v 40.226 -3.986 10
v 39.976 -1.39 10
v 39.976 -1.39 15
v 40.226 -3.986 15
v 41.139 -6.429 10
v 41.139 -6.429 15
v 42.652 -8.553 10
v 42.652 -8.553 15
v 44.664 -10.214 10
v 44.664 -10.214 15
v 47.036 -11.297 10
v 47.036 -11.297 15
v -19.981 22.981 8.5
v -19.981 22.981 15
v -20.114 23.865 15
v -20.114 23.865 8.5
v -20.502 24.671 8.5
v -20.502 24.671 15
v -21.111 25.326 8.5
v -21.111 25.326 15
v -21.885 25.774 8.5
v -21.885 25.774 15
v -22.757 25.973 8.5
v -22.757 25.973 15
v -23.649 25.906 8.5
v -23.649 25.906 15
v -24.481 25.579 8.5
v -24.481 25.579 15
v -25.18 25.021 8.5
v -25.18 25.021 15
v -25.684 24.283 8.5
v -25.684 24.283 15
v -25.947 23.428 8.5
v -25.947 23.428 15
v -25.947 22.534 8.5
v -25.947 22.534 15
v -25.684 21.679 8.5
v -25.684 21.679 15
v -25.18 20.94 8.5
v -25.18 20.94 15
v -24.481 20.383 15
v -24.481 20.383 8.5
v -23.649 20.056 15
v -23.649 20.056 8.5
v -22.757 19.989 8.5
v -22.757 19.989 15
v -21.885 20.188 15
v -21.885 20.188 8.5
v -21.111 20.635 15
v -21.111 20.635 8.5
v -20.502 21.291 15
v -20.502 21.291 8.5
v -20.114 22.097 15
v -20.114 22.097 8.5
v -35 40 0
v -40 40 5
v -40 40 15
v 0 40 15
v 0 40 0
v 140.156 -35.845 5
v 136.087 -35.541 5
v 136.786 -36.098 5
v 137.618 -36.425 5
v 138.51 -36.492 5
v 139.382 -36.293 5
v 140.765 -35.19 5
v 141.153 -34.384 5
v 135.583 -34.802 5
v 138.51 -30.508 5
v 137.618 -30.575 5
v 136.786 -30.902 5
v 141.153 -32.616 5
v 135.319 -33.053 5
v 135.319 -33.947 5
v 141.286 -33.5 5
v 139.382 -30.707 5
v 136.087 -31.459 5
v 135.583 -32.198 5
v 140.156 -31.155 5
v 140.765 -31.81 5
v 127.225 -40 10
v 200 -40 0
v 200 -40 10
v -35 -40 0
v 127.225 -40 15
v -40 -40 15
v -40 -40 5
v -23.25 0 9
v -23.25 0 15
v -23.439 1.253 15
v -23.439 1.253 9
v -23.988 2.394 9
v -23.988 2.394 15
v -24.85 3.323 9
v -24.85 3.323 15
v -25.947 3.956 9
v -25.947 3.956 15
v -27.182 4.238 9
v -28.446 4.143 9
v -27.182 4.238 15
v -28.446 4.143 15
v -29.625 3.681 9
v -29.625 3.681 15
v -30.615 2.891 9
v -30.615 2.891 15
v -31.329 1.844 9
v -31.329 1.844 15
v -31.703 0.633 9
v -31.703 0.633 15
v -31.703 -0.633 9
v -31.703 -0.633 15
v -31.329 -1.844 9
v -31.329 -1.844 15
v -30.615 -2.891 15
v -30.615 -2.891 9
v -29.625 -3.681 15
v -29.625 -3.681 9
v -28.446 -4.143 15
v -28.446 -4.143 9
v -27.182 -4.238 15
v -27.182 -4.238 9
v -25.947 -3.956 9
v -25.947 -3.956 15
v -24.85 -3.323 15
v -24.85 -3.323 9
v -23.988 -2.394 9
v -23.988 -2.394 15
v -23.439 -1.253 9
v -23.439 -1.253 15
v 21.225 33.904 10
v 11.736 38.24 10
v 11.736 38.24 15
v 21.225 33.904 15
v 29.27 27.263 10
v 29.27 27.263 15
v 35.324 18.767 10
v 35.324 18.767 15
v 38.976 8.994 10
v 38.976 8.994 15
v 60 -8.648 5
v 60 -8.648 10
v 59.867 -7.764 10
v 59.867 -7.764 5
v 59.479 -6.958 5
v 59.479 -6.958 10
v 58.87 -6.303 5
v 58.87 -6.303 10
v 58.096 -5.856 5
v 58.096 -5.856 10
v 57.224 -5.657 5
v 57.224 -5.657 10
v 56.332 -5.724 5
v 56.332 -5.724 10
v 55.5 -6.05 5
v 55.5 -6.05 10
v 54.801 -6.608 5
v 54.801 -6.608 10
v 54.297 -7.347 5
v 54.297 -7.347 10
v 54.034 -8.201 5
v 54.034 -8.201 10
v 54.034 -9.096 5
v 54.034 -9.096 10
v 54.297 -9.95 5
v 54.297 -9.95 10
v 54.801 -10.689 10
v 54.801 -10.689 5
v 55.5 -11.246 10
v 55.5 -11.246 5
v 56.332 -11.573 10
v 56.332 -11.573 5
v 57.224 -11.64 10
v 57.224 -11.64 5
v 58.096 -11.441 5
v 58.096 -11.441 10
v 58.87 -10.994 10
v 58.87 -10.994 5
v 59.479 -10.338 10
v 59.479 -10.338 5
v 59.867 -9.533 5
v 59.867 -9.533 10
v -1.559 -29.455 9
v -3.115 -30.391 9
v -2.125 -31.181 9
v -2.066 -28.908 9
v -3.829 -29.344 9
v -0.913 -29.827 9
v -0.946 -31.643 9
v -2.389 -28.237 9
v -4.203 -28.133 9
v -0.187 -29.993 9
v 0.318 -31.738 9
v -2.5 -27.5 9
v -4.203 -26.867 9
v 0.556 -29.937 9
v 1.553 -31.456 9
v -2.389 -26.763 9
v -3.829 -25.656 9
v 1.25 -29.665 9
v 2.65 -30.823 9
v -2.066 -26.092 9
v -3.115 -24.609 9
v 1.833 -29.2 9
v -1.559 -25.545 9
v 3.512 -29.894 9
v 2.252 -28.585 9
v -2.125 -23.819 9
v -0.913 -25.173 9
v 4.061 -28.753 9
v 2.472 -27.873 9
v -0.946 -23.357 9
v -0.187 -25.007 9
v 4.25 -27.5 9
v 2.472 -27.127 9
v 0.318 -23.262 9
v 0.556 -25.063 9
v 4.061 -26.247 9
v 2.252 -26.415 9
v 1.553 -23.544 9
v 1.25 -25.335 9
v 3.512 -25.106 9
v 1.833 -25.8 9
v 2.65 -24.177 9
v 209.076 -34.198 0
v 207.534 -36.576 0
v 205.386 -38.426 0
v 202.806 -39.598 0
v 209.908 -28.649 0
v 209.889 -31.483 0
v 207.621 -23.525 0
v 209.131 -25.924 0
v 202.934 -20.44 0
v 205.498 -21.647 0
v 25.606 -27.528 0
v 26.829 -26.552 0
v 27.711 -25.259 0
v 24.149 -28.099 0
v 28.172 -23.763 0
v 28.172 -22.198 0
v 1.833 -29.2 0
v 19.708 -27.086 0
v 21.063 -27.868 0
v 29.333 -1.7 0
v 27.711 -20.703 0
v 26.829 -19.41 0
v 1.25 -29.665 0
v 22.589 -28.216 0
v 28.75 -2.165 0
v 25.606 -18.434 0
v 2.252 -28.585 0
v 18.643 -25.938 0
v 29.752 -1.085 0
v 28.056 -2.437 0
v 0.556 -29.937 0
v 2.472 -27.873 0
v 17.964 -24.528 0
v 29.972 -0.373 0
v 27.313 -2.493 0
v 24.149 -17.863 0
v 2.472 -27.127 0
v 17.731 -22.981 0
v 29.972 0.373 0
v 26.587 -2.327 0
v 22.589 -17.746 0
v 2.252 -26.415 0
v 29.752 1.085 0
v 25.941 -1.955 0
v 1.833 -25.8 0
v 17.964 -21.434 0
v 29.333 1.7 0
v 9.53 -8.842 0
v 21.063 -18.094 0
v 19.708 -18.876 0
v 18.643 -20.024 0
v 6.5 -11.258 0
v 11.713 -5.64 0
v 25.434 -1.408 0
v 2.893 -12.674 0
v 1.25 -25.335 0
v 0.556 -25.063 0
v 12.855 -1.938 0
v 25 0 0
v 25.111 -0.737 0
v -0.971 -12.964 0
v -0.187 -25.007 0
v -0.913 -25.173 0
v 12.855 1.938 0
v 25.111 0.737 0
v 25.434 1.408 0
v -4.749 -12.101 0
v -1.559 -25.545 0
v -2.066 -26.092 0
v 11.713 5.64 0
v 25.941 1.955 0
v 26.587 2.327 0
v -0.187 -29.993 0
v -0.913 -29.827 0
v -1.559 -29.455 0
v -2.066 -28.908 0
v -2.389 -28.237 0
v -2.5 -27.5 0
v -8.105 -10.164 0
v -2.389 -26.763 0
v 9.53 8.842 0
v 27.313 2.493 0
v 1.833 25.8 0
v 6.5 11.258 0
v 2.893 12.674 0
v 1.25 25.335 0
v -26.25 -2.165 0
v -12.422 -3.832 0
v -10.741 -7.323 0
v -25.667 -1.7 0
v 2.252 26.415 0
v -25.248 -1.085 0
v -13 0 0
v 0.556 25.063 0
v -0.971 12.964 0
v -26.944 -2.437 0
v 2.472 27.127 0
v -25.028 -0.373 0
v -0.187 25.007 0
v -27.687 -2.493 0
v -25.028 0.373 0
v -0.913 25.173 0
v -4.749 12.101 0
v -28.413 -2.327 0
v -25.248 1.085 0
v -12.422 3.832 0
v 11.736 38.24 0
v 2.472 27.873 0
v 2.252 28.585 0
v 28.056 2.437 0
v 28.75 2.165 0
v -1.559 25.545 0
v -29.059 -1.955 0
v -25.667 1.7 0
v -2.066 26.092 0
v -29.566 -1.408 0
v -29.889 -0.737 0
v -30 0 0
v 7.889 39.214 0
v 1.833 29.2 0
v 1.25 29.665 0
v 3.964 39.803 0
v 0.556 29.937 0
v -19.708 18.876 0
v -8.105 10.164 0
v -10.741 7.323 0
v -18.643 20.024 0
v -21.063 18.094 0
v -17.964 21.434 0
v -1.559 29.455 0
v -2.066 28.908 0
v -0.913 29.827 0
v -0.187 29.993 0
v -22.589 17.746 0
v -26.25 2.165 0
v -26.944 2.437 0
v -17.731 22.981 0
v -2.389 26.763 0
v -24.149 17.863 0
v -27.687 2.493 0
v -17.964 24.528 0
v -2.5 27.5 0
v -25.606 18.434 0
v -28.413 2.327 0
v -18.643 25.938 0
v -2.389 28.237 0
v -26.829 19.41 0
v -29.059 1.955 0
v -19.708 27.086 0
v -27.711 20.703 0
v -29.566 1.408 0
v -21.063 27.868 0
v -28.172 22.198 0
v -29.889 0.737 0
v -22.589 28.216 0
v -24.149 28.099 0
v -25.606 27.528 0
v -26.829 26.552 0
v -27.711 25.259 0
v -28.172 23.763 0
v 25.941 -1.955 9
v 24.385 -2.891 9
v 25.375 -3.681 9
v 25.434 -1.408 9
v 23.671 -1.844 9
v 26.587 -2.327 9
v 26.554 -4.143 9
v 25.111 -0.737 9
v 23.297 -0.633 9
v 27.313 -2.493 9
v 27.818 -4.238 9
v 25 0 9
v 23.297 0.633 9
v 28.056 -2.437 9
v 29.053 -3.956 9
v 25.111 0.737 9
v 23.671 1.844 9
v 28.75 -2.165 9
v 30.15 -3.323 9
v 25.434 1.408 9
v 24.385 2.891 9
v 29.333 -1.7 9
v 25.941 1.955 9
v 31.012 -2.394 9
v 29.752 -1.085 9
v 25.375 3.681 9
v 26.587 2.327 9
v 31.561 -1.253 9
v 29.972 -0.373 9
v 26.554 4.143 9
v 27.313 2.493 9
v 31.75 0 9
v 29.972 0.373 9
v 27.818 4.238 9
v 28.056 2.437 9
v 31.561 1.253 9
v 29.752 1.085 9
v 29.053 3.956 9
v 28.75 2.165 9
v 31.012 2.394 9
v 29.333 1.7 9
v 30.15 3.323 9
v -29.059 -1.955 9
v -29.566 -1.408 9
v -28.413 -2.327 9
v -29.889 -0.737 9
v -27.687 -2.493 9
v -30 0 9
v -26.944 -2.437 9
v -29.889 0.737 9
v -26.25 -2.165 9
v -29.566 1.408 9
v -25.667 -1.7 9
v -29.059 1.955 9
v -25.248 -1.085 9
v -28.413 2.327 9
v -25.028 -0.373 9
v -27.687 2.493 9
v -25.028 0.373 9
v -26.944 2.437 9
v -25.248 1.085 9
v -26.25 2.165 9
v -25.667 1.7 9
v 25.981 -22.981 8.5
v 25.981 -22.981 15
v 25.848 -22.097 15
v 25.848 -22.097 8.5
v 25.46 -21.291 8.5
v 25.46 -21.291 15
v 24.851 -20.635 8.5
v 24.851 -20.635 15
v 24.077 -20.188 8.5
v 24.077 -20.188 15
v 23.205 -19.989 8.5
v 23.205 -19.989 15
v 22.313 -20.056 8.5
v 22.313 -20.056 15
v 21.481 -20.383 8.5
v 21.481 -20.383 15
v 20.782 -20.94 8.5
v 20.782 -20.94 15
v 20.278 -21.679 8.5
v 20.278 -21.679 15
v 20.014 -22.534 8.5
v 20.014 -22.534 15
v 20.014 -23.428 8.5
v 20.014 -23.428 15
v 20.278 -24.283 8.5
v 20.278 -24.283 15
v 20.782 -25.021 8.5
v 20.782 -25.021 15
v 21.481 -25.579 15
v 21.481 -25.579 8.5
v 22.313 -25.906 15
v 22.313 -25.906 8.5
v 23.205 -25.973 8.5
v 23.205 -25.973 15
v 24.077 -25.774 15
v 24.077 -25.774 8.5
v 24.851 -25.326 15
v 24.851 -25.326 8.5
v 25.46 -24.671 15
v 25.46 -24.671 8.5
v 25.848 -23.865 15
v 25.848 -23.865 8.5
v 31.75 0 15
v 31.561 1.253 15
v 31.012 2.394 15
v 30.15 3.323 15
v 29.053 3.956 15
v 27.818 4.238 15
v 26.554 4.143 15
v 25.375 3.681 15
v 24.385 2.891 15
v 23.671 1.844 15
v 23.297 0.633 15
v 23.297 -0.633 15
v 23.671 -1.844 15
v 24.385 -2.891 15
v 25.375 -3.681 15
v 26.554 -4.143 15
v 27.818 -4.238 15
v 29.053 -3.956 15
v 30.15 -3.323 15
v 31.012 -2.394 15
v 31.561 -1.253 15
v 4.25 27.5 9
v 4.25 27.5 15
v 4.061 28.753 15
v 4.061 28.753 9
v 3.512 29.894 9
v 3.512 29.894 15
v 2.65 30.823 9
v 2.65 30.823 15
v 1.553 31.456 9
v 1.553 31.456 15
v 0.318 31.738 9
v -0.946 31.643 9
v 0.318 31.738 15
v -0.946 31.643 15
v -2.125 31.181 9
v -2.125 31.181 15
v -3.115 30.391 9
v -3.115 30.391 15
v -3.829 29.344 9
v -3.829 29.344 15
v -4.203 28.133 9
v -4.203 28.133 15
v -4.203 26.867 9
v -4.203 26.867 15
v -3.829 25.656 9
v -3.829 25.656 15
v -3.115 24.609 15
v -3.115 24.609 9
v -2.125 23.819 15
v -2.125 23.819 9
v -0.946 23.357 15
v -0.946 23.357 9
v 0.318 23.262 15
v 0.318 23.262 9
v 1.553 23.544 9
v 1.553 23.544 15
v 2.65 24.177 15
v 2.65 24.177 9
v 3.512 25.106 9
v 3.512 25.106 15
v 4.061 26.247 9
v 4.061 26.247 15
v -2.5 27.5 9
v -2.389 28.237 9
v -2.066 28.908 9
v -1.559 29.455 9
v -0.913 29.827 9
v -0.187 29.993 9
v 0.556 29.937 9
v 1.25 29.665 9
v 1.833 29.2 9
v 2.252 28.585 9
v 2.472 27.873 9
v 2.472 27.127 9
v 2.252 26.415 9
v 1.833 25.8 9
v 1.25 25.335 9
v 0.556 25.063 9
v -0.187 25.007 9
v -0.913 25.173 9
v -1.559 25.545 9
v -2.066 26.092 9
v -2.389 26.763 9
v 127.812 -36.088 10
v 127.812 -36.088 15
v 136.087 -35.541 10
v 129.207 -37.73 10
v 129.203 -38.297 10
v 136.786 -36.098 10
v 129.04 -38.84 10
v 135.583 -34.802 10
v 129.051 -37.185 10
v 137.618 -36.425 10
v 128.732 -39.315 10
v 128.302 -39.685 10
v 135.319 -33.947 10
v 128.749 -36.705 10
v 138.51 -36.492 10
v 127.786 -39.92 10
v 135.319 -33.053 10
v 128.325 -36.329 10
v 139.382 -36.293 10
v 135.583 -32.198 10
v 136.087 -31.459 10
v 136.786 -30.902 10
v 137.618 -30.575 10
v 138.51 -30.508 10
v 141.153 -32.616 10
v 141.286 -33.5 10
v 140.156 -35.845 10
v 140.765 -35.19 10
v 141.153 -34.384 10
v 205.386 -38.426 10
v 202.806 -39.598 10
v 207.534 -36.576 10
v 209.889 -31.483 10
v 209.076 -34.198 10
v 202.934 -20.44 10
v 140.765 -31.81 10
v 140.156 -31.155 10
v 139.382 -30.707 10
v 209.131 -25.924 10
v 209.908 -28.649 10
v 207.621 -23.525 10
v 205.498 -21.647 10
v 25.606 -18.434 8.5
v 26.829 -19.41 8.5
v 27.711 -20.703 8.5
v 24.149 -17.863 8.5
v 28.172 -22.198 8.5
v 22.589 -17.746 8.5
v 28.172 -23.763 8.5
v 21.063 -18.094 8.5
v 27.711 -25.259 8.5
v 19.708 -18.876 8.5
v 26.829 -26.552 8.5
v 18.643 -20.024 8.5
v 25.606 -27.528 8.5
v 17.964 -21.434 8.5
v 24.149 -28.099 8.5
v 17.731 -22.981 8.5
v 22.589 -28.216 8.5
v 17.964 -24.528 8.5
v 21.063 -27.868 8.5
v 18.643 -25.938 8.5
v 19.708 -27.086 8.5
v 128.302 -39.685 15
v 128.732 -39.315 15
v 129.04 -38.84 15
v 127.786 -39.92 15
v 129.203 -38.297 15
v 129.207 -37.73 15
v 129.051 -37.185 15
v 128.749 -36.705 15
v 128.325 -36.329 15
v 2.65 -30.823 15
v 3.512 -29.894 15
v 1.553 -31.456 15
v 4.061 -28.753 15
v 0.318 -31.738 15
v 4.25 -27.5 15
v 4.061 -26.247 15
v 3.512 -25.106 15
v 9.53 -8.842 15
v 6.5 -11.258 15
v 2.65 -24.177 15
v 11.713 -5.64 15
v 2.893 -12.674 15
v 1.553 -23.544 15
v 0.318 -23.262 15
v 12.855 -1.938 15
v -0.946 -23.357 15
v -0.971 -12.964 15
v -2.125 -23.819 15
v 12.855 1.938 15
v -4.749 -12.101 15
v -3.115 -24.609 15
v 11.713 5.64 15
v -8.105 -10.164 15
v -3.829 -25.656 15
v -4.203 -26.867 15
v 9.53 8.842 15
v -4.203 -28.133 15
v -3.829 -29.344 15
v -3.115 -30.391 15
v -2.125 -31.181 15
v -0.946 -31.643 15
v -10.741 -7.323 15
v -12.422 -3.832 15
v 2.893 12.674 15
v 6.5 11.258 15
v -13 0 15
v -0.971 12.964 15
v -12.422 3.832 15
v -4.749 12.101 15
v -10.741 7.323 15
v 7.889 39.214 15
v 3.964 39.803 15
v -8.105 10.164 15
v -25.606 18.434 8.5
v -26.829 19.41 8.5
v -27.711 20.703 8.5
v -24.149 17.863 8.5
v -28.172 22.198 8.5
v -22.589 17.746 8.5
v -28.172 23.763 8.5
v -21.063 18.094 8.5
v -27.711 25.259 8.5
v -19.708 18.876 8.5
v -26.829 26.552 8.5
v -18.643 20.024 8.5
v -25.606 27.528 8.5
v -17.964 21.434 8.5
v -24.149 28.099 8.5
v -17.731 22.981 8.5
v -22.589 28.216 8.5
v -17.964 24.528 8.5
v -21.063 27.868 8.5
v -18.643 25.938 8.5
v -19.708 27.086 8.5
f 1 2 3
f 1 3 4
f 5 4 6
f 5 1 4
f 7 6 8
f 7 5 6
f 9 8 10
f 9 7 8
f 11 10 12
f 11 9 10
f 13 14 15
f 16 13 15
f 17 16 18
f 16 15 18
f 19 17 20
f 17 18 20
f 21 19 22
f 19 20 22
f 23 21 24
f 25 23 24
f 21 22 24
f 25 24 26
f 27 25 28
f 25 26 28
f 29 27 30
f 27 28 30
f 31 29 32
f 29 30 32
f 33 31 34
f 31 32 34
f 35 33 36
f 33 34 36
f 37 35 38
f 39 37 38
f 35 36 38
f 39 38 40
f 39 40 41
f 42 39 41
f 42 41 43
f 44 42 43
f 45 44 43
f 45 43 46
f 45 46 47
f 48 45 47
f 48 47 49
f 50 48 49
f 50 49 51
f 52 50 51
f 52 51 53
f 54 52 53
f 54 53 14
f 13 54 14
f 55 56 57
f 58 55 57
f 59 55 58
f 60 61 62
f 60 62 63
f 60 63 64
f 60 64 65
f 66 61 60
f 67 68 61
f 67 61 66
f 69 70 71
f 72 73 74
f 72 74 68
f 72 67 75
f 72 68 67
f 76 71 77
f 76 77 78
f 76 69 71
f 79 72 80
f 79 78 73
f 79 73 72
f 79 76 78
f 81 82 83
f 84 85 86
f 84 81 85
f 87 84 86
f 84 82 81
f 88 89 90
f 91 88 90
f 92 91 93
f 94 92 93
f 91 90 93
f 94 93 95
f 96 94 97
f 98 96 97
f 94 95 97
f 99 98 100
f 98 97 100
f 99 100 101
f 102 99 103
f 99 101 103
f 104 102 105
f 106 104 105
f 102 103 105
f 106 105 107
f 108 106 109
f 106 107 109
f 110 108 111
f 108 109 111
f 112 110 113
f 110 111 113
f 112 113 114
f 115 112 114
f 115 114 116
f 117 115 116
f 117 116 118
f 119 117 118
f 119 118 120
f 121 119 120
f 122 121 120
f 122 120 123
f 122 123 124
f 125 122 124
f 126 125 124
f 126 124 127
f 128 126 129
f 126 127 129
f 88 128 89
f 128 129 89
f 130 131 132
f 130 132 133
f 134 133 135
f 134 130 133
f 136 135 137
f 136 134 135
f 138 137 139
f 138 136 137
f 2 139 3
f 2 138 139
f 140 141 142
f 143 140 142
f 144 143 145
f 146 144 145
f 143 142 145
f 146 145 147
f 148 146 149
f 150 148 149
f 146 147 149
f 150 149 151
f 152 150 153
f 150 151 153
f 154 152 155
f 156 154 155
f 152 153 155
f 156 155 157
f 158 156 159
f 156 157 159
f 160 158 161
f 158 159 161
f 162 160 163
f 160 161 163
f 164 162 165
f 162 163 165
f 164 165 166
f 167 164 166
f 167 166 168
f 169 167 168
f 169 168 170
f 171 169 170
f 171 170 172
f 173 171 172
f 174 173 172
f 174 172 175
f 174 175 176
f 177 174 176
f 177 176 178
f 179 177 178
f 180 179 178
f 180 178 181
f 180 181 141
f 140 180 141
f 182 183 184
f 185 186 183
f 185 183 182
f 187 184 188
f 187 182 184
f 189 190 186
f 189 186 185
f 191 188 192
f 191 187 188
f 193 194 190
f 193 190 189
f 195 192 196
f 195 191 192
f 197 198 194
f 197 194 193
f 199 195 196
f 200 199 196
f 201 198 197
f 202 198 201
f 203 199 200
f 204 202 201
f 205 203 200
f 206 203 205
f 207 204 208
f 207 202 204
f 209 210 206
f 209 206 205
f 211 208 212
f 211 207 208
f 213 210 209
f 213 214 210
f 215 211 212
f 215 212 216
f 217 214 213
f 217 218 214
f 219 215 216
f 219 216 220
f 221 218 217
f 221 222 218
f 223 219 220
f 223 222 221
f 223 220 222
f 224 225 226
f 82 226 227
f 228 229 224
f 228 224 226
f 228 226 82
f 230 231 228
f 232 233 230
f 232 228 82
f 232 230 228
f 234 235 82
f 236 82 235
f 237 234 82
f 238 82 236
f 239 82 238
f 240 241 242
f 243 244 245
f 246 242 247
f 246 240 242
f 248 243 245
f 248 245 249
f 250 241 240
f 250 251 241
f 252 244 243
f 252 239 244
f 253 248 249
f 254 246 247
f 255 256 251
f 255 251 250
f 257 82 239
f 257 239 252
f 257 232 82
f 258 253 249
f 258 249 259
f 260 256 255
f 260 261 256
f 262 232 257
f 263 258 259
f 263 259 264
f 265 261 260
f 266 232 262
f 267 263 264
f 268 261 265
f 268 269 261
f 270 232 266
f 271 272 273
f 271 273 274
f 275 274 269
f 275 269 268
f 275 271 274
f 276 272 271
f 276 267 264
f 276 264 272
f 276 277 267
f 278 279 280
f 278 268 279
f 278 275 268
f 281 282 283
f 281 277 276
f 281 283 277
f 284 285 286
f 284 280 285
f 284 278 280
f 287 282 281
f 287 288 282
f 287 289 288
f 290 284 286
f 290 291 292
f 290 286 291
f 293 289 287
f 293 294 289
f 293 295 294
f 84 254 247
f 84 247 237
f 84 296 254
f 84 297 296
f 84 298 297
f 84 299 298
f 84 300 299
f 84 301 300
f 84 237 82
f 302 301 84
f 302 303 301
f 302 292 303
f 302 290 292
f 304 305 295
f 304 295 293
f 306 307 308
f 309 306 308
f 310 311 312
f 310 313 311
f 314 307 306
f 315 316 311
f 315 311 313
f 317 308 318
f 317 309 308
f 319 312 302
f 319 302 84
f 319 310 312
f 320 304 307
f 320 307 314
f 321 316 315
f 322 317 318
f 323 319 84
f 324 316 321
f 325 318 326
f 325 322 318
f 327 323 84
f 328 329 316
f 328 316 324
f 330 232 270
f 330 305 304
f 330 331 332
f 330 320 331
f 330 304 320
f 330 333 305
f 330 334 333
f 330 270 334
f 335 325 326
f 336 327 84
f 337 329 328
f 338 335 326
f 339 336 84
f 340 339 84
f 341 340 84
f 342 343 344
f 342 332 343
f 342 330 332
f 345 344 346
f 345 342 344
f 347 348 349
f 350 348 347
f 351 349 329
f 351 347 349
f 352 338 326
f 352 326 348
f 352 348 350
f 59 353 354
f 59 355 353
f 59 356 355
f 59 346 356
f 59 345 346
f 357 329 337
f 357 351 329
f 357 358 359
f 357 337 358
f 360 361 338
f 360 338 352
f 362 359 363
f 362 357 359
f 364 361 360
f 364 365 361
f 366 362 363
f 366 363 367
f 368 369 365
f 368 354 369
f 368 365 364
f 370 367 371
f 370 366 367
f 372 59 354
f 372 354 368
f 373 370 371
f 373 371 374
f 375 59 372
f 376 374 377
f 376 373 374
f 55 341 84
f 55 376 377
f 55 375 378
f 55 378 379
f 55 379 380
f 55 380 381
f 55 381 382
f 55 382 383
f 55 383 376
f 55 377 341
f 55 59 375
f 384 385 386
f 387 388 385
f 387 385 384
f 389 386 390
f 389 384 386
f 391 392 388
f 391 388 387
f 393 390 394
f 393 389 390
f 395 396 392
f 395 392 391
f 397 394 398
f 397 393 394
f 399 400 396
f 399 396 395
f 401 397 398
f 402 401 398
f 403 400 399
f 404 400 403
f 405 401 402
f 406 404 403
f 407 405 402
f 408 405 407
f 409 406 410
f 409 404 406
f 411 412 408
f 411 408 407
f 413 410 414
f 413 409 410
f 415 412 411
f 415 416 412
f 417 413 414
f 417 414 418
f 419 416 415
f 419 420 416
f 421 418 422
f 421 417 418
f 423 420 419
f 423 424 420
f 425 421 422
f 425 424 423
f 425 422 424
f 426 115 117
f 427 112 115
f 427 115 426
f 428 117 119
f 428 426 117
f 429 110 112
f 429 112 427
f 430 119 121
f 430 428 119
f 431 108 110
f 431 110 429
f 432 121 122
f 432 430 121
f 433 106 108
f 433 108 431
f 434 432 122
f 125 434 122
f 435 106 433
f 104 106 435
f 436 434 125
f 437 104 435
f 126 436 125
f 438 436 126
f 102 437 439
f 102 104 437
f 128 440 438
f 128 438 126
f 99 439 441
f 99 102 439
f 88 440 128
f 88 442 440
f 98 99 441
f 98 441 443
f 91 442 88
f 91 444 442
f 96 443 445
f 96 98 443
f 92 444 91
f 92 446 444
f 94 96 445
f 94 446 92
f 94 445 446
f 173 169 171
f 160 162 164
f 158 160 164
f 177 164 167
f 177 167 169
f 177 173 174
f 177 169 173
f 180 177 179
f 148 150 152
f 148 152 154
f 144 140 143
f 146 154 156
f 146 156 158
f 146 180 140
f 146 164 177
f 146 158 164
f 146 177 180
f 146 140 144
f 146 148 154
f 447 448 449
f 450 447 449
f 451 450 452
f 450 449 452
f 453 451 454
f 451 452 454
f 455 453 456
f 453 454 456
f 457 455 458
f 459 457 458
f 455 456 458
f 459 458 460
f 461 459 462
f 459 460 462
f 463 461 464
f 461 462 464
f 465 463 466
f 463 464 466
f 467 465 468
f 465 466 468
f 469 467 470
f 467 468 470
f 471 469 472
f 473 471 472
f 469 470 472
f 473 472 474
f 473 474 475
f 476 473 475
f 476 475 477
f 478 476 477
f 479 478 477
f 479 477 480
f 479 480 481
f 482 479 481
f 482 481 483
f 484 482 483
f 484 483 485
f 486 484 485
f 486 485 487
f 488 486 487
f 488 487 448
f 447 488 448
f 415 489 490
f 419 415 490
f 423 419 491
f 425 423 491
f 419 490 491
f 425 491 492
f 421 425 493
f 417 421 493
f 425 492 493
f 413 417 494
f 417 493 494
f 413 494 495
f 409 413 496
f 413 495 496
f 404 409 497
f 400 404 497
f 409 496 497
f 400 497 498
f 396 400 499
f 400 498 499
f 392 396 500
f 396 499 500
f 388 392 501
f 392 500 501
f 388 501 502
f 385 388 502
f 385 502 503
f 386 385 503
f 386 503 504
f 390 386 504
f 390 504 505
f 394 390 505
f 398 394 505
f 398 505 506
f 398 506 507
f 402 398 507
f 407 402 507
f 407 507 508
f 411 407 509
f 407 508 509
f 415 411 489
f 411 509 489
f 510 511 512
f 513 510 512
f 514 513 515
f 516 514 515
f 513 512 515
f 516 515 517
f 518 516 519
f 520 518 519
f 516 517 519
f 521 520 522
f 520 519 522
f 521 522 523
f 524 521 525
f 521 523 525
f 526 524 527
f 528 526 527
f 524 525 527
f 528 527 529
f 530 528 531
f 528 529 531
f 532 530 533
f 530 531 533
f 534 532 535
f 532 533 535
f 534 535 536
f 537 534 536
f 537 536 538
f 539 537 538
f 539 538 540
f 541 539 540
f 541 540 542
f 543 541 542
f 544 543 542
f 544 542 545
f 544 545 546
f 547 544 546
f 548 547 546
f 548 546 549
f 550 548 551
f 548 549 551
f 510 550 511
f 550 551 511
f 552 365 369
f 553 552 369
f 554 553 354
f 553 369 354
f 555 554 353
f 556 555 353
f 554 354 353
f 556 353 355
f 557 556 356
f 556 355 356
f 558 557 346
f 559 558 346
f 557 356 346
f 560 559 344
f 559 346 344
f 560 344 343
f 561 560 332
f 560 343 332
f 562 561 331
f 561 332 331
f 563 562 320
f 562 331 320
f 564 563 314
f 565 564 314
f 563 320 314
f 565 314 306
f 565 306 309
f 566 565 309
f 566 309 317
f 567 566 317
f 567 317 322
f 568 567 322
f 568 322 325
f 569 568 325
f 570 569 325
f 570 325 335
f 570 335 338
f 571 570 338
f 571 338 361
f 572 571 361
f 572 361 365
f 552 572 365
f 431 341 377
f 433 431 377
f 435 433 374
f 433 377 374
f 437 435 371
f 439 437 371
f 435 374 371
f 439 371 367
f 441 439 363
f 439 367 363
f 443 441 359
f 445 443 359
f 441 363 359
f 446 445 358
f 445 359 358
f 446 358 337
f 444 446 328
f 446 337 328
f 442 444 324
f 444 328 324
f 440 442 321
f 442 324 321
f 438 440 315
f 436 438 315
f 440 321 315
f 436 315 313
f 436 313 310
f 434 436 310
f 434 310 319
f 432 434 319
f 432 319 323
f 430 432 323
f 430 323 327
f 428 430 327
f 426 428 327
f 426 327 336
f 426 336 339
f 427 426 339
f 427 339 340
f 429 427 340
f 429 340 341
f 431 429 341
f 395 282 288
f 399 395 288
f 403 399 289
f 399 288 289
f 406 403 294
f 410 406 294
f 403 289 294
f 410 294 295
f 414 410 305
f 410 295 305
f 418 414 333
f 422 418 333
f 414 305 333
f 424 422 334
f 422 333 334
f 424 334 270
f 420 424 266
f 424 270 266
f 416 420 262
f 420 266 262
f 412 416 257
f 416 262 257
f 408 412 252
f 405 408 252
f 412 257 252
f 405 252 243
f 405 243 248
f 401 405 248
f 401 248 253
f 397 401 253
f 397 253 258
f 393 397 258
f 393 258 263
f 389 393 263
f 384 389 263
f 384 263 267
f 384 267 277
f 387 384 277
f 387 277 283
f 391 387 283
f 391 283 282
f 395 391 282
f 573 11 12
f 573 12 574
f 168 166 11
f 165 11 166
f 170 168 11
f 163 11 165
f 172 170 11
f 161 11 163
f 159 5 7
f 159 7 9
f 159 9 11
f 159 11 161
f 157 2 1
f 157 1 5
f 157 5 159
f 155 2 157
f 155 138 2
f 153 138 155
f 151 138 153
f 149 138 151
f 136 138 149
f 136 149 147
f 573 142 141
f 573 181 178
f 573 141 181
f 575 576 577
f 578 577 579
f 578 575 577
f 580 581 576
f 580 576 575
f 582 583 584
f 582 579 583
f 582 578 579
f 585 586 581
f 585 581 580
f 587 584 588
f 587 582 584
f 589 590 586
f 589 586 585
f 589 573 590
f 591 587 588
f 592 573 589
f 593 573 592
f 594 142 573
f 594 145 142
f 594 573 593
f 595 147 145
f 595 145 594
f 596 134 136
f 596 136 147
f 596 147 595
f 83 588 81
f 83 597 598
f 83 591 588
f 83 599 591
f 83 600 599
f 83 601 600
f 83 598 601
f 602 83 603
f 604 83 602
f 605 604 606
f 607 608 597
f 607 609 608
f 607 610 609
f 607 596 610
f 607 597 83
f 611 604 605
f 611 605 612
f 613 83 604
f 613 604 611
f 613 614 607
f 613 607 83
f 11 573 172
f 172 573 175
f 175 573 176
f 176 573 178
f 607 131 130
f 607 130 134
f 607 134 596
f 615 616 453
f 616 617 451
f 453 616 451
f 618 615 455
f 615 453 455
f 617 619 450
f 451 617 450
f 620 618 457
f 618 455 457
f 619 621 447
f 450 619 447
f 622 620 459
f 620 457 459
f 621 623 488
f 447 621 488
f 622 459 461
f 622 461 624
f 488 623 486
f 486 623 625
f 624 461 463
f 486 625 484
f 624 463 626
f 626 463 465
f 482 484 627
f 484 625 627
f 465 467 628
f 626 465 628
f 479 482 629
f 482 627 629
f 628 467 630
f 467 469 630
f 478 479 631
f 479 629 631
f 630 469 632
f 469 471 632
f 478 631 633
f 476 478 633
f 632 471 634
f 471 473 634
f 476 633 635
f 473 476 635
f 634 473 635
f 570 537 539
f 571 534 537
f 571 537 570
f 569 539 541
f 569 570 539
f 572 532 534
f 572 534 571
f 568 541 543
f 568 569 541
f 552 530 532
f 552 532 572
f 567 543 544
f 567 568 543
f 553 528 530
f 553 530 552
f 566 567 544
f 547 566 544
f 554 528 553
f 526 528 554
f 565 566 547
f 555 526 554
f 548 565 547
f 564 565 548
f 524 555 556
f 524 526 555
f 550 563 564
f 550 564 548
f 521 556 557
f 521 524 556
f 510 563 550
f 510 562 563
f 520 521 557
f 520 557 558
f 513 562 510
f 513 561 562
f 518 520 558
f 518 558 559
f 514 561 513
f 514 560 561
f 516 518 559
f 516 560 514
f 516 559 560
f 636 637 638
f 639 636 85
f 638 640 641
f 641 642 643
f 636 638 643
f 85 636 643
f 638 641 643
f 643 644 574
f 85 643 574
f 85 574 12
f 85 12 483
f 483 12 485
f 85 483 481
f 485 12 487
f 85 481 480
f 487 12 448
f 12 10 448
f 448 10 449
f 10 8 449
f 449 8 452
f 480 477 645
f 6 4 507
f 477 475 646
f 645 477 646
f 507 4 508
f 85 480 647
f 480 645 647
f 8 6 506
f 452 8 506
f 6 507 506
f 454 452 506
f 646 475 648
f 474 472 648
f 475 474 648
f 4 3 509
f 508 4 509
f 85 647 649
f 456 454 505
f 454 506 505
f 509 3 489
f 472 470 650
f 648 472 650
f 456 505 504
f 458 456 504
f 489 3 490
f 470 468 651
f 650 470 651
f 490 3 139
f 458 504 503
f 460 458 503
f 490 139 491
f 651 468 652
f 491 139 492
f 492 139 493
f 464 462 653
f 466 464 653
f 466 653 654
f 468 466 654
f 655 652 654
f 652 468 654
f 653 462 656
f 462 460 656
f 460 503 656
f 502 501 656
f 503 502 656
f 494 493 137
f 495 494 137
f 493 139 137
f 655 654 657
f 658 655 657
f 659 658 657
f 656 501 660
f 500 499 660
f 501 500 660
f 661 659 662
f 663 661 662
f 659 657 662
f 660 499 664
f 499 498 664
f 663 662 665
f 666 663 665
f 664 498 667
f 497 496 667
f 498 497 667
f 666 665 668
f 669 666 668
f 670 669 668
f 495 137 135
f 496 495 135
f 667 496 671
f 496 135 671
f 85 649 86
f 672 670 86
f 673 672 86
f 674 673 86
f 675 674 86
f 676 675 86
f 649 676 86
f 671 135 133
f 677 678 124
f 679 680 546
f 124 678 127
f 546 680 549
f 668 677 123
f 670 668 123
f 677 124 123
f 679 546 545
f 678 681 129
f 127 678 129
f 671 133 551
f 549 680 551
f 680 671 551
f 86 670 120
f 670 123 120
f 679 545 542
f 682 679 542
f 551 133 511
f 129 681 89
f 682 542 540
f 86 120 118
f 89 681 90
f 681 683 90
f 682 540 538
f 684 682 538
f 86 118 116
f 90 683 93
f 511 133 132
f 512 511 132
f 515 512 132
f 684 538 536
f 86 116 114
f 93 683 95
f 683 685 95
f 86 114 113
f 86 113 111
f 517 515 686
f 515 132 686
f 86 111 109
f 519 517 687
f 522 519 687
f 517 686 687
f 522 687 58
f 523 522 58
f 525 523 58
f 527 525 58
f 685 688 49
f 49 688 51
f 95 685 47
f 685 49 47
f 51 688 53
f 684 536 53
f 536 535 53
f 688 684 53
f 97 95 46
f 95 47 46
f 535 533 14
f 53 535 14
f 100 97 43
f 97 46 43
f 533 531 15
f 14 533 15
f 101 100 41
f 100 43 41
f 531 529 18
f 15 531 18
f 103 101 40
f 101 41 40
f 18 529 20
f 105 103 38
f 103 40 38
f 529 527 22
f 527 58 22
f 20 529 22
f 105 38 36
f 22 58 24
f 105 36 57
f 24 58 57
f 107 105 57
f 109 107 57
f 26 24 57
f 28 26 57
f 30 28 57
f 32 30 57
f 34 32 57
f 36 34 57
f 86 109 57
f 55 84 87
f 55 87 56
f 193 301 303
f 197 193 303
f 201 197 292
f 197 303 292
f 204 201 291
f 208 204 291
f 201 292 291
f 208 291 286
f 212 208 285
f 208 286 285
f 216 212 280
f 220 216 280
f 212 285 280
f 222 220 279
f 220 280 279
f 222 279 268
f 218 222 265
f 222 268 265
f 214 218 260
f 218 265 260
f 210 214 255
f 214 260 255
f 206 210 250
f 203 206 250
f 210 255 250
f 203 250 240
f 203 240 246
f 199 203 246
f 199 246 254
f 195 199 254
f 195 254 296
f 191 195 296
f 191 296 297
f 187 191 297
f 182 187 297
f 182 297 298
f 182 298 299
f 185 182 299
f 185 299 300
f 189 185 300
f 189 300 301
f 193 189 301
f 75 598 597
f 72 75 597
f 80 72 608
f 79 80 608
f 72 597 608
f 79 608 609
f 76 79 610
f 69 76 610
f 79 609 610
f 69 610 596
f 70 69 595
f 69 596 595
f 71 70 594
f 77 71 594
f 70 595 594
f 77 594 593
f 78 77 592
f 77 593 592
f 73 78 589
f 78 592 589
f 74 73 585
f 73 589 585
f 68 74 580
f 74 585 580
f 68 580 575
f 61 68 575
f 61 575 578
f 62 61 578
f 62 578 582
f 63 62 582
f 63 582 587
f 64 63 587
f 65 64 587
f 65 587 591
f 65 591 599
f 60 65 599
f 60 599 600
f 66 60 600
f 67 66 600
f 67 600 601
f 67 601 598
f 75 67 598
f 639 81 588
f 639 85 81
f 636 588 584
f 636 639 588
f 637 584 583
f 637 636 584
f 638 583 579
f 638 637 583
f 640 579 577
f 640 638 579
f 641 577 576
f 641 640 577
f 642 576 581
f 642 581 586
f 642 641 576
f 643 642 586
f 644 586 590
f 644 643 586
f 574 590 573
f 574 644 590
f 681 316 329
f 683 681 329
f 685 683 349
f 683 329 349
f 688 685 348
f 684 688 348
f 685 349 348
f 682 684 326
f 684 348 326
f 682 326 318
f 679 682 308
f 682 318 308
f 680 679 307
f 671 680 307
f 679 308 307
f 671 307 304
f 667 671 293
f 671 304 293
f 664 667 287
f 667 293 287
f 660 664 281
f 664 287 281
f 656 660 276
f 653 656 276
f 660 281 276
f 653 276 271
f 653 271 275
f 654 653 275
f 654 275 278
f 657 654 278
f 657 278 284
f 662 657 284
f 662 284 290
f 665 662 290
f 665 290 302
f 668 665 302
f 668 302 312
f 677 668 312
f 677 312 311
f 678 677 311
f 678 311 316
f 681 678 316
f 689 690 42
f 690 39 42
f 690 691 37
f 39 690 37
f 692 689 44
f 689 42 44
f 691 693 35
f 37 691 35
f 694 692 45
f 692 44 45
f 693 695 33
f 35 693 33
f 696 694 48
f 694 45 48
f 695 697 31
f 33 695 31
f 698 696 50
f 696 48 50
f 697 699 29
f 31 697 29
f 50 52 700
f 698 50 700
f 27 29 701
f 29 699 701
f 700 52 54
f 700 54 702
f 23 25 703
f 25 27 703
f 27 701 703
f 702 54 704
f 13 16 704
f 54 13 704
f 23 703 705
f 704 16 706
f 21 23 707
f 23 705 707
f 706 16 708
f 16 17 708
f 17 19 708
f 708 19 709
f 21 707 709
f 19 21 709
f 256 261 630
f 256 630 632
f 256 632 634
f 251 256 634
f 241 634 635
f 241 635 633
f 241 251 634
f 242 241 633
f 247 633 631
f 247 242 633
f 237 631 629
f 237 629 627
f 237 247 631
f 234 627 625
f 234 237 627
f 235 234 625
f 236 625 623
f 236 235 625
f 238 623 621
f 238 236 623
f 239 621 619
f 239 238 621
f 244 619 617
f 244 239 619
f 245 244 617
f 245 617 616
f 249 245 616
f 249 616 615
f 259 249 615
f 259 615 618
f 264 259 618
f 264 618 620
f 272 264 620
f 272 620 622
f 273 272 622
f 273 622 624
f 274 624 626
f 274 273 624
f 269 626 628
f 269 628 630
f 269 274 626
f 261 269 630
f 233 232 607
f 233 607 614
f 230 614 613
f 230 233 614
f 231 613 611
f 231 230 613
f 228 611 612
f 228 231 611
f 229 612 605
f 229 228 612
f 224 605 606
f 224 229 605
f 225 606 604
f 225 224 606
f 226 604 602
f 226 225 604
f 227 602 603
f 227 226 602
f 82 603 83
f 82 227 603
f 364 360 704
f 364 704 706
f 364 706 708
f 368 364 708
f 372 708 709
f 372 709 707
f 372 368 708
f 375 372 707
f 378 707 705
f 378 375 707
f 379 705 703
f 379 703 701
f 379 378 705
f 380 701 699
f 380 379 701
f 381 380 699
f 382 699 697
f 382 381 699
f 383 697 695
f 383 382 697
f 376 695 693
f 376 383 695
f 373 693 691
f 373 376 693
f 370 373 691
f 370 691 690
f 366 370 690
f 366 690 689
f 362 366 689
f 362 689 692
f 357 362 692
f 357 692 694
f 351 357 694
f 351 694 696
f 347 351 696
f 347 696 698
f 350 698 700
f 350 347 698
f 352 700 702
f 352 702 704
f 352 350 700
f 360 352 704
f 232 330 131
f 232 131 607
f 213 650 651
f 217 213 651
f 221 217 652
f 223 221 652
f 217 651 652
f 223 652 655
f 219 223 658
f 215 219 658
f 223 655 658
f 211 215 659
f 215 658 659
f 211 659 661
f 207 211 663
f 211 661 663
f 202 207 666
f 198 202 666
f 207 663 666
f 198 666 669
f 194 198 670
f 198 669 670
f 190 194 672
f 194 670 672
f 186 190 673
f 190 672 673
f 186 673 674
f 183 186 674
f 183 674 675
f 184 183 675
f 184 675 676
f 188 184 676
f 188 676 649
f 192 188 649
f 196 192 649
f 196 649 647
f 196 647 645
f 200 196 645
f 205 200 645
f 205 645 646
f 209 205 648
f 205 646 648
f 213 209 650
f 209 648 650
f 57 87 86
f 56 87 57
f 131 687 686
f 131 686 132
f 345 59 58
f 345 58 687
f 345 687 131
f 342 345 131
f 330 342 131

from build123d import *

# Parameters (mm, degrees)
ESTRUSIONE1_DEPTH        = 15
SMUSSO1_SIZE             = 5
SCHIZZO2_R               = 13
TAGLIO_ESTRUSIONE1_DEPTH = 59.523499554
SCHIZZO4_R               = 3
TAGLIO_ESTRUSIONE3_DEPTH = 20
SCHIZZO5_R               = 5.25
TAGLIO_ESTRUSIONE4_DEPTH = 8.5
SCHIZZO6_R               = 2.5
TAGLIO_ESTRUSIONE5_DEPTH = 20
SCHIZZO7_R               = 4.25
TAGLIO_ESTRUSIONE6_DEPTH = 6
ESTRUSIONE2_START        = -15
ESTRUSIONE2_DEPTH        = 15
TAGLIO_ESTRUSIONE7_START = -5
TAGLIO_ESTRUSIONE7_DEPTH = 5
SCHIZZO10_R              = 3
TAGLIO_ESTRUSIONE8_DEPTH = 10
RACCORDO1_R              = 2


with BuildPart() as part:
    # Schizzo1 → Estrusione1 (new body)
    with BuildSketch(Plane.XY):
        with BuildLine():
            Line((-40, 40), (0, 40))
            ThreePointArc((0, 40), (40, 0), (0, -40))
            Line((0, -40), (-40, -40))
            Line((-40, -40), (-40, 40))
        make_face()
    extrude(amount=ESTRUSIONE1_DEPTH)

    # Smusso1
    smusso1_edges = [part.edges().sort_by_distance(p)[0] for p in [
        (-40, 0, 0),
    ]]
    chamfer(smusso1_edges, length=SMUSSO1_SIZE)

    # Schizzo2 → Taglio-Estrusione1 (cut, through all)
    with BuildSketch(Plane(origin=(0, 0, 0), x_dir=(-1, 0, 0), z_dir=(0, 0, -1))):
        Circle(SCHIZZO2_R)
    extrude(amount=-TAGLIO_ESTRUSIONE1_DEPTH, mode=Mode.SUBTRACT)

    # Schizzo4 → Taglio-Estrusione3 (cut)
    with BuildSketch(Plane.XY.offset(15)):
        with Locations((-22.980970389, 22.980970389)):
            Circle(SCHIZZO4_R)
        with Locations((22.980970389, -22.980970389)):
            Circle(SCHIZZO4_R)
    extrude(amount=-TAGLIO_ESTRUSIONE3_DEPTH, mode=Mode.SUBTRACT)

    # Schizzo5 → Taglio-Estrusione4 (cut)
    with BuildSketch(Plane.XY):
        with Locations((-22.980970389, 22.980970389)):
            Circle(SCHIZZO5_R)
        with Locations(Location((22.980970389, -22.980970389, 0), (0, 0, 180))):
            Circle(SCHIZZO5_R)
    extrude(amount=TAGLIO_ESTRUSIONE4_DEPTH, mode=Mode.SUBTRACT)

    # Schizzo6 → Taglio-Estrusione5 (cut)
    with BuildSketch(Plane(origin=(0, 0, 0), x_dir=(-1, 0, 0), z_dir=(0, 0, -1))):
        with Locations((27.5, 0)):
            Circle(SCHIZZO6_R)
        with Locations((0, -27.5)):
            Circle(SCHIZZO6_R)
        with Locations((-27.5, 0)):
            Circle(SCHIZZO6_R)
        with Locations((0, 27.5)):
            Circle(SCHIZZO6_R)
    extrude(amount=-TAGLIO_ESTRUSIONE5_DEPTH, mode=Mode.SUBTRACT)

    # Schizzo7 → Taglio-Estrusione6 (cut)
    with BuildSketch(Plane.XY.offset(15)):
        with Locations((0, 27.5)):
            Circle(SCHIZZO7_R)
        with Locations((-27.5, 0)):
            Circle(SCHIZZO7_R)
        with Locations((27.5, 0)):
            Circle(SCHIZZO7_R)
        with Locations((0, -27.5)):
            Circle(SCHIZZO7_R)
    extrude(amount=-TAGLIO_ESTRUSIONE6_DEPTH, mode=Mode.SUBTRACT)

    # Schizzo8 → Estrusione2 (add)
    with BuildSketch(Plane.XY.offset(15).offset(ESTRUSIONE2_START)):
        with BuildLine():
            Line((11.73594132, 38.239608802), (202.93398533, -20.4400978))
            ThreePointArc((202.93398533, -20.4400978), (209.889363529, -31.483404529), (200, -40))
            Line((200, -40), (0, -40))
            ThreePointArc((0, -40), (39.557454115, -5.933618117), (11.73594132, 38.239608802))
        make_face()
    extrude(amount=ESTRUSIONE2_DEPTH)

    # Schizzo9 → Taglio-Estrusione7 (cut)
    with BuildSketch(Plane.XY.offset(15).offset(TAGLIO_ESTRUSIONE7_START)):
        with BuildLine():
            Line((140.558333333, -40), (200, -40))
            ThreePointArc((200, -40), (209.889363529, -31.483404529), (202.93398533, -20.4400978))
            Line((202.93398533, -20.4400978), (11.73594132, 38.239608802))
            ThreePointArc((11.73594132, 38.239608802), (32.5753606, 23.213054125), (39.975840489, -1.390027772))
            ThreePointArc((39.975840489, -1.390027772), (41.825960461, -7.540798246), (47.035815281, -11.297436915))
            Line((47.035815281, -11.297436915), (140.558333333, -40))
        make_face()
    extrude(amount=TAGLIO_ESTRUSIONE7_DEPTH, mode=Mode.SUBTRACT)

    # Schizzo10 → Taglio-Estrusione8 (cut)
    with BuildSketch(Plane.XY.offset(15)):
        with Locations((57, -8.648405099)):
            Circle(SCHIZZO10_R)
        with Locations((138.285904257, -33.5)):
            Circle(SCHIZZO10_R)
    extrude(amount=-TAGLIO_ESTRUSIONE8_DEPTH, mode=Mode.SUBTRACT)

    # Raccordo1
    raccordo1_edges = [part.edges().sort_by_distance(p)[0] for p in [
        (140.558333333, -40, 12.5),
    ]]
    fillet(raccordo1_edges, radius=RACCORDO1_R)


solid = part.part
